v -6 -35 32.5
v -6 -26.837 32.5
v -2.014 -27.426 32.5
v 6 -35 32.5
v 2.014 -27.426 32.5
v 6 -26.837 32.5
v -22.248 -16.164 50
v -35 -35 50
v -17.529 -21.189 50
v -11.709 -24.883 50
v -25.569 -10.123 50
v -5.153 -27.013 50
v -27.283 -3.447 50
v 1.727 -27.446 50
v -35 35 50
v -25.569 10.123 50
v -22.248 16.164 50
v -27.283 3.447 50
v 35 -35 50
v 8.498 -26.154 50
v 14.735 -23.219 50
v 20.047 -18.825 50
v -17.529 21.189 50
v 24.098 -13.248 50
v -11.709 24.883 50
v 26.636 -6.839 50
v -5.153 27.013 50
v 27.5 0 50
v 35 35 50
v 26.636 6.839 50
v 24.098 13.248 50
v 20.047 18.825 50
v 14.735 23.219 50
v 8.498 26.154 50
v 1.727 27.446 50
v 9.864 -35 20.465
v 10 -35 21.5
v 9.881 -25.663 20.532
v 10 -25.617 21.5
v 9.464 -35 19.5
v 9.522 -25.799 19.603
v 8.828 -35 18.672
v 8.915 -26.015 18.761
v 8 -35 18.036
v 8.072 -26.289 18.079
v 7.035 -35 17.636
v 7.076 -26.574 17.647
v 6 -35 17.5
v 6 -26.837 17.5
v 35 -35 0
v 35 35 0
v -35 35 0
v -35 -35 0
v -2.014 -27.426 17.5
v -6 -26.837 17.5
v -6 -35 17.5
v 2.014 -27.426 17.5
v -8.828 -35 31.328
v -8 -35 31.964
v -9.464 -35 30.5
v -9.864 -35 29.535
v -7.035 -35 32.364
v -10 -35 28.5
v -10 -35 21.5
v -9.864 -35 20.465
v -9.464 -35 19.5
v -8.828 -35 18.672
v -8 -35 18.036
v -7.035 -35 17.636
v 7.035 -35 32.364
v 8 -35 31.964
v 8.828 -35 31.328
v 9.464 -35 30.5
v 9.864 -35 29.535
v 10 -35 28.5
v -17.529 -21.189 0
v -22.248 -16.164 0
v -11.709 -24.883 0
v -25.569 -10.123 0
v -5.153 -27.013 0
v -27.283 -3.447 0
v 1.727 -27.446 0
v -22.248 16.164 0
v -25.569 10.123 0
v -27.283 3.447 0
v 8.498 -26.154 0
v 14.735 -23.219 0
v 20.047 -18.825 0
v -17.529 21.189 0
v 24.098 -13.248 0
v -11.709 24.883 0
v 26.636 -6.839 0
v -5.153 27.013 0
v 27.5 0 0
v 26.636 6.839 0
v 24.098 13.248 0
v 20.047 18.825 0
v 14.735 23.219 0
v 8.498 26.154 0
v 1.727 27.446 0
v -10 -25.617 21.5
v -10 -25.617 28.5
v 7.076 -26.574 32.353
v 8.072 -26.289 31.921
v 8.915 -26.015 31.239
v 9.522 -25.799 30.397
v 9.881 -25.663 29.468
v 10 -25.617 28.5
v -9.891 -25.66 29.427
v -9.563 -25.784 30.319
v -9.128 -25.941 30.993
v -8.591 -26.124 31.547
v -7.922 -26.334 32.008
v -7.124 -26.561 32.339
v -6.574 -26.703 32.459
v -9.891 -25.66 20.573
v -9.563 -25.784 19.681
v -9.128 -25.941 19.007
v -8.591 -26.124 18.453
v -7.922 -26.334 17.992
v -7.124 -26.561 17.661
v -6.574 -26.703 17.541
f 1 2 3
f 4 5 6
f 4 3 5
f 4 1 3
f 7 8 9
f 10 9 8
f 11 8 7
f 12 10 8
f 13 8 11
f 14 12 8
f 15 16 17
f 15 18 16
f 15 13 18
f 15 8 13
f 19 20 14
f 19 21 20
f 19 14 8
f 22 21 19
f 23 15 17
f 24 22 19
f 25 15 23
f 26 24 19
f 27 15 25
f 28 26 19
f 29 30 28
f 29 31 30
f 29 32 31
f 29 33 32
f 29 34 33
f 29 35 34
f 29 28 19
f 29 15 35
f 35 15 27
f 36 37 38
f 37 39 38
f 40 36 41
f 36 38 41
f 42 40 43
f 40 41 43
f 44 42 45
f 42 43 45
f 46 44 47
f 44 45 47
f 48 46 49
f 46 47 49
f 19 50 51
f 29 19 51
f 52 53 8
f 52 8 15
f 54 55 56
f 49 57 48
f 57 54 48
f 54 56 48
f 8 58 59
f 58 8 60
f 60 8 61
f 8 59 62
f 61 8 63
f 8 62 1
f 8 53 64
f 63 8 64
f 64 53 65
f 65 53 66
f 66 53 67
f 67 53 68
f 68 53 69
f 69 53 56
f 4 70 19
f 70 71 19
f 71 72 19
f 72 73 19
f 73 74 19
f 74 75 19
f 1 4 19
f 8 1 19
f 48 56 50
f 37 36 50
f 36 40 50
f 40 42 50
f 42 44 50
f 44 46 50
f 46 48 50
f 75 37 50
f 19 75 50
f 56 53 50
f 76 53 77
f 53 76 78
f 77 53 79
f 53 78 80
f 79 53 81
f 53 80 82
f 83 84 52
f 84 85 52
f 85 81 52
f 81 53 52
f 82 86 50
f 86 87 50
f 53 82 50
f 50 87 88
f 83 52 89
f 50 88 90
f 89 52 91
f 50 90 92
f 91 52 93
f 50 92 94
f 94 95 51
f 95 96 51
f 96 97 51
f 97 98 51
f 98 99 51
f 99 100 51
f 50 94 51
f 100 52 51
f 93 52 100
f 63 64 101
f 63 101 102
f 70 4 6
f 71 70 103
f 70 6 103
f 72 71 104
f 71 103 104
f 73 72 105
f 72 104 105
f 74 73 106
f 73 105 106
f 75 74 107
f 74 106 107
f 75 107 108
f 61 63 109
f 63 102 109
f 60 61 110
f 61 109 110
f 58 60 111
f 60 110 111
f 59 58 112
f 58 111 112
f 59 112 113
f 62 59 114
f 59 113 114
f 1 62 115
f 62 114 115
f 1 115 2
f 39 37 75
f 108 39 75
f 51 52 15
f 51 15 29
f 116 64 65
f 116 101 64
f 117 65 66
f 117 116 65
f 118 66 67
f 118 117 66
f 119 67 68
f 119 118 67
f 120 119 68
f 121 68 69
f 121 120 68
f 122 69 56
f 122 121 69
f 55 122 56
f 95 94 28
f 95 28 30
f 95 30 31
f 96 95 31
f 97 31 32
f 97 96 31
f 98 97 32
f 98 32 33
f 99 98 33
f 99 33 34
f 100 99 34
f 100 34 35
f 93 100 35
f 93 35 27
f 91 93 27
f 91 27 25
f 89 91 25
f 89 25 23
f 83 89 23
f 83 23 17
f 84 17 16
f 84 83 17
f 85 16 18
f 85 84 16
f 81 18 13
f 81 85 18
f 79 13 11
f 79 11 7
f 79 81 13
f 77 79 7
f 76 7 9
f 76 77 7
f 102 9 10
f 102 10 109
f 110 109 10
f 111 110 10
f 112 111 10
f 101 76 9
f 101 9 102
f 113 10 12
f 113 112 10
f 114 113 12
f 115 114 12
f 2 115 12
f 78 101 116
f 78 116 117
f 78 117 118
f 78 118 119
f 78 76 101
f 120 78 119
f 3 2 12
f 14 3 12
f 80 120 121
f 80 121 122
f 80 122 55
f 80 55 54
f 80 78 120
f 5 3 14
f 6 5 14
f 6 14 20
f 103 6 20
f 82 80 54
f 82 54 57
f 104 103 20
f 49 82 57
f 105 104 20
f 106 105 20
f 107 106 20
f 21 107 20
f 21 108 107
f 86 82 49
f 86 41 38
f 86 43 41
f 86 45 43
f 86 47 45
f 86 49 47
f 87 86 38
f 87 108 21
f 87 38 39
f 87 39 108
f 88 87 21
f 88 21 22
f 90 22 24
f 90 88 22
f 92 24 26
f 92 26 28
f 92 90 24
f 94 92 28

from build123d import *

# Parameters (mm, degrees)
F0_W     = 70
F0_H     = 70
F0_R     = 27.5
F1_DEPTH = 50
F2_W     = 20
F2_H     = 15
F3_DEPTH = 25
F4_R     = 4


with BuildPart() as f1:
    # F0 (on Top) → F1 (new body)
    with BuildSketch(Plane.XY):
        Rectangle(F0_W, F0_H)
        Circle(F0_R, mode=Mode.SUBTRACT)
    extrude(amount=F1_DEPTH)

    # F2 (on face) → F3 (cut)
    with BuildSketch(Plane.XZ.offset(35)):
        with Locations((0, 25)):
            Rectangle(F2_W, F2_H)
    extrude(amount=-F3_DEPTH, mode=Mode.SUBTRACT)

    # F4
    f4_edges = [f1.edges().sort_by_distance(p)[0] for p in [
        (-10, -30.308688, 32.5),
        (10, -30.308688, 32.5),
        (10, -30.308688, 17.5),
        (-10, -30.308688, 17.5),
    ]]
    fillet(f4_edges, radius=F4_R)


solid = f1.part
